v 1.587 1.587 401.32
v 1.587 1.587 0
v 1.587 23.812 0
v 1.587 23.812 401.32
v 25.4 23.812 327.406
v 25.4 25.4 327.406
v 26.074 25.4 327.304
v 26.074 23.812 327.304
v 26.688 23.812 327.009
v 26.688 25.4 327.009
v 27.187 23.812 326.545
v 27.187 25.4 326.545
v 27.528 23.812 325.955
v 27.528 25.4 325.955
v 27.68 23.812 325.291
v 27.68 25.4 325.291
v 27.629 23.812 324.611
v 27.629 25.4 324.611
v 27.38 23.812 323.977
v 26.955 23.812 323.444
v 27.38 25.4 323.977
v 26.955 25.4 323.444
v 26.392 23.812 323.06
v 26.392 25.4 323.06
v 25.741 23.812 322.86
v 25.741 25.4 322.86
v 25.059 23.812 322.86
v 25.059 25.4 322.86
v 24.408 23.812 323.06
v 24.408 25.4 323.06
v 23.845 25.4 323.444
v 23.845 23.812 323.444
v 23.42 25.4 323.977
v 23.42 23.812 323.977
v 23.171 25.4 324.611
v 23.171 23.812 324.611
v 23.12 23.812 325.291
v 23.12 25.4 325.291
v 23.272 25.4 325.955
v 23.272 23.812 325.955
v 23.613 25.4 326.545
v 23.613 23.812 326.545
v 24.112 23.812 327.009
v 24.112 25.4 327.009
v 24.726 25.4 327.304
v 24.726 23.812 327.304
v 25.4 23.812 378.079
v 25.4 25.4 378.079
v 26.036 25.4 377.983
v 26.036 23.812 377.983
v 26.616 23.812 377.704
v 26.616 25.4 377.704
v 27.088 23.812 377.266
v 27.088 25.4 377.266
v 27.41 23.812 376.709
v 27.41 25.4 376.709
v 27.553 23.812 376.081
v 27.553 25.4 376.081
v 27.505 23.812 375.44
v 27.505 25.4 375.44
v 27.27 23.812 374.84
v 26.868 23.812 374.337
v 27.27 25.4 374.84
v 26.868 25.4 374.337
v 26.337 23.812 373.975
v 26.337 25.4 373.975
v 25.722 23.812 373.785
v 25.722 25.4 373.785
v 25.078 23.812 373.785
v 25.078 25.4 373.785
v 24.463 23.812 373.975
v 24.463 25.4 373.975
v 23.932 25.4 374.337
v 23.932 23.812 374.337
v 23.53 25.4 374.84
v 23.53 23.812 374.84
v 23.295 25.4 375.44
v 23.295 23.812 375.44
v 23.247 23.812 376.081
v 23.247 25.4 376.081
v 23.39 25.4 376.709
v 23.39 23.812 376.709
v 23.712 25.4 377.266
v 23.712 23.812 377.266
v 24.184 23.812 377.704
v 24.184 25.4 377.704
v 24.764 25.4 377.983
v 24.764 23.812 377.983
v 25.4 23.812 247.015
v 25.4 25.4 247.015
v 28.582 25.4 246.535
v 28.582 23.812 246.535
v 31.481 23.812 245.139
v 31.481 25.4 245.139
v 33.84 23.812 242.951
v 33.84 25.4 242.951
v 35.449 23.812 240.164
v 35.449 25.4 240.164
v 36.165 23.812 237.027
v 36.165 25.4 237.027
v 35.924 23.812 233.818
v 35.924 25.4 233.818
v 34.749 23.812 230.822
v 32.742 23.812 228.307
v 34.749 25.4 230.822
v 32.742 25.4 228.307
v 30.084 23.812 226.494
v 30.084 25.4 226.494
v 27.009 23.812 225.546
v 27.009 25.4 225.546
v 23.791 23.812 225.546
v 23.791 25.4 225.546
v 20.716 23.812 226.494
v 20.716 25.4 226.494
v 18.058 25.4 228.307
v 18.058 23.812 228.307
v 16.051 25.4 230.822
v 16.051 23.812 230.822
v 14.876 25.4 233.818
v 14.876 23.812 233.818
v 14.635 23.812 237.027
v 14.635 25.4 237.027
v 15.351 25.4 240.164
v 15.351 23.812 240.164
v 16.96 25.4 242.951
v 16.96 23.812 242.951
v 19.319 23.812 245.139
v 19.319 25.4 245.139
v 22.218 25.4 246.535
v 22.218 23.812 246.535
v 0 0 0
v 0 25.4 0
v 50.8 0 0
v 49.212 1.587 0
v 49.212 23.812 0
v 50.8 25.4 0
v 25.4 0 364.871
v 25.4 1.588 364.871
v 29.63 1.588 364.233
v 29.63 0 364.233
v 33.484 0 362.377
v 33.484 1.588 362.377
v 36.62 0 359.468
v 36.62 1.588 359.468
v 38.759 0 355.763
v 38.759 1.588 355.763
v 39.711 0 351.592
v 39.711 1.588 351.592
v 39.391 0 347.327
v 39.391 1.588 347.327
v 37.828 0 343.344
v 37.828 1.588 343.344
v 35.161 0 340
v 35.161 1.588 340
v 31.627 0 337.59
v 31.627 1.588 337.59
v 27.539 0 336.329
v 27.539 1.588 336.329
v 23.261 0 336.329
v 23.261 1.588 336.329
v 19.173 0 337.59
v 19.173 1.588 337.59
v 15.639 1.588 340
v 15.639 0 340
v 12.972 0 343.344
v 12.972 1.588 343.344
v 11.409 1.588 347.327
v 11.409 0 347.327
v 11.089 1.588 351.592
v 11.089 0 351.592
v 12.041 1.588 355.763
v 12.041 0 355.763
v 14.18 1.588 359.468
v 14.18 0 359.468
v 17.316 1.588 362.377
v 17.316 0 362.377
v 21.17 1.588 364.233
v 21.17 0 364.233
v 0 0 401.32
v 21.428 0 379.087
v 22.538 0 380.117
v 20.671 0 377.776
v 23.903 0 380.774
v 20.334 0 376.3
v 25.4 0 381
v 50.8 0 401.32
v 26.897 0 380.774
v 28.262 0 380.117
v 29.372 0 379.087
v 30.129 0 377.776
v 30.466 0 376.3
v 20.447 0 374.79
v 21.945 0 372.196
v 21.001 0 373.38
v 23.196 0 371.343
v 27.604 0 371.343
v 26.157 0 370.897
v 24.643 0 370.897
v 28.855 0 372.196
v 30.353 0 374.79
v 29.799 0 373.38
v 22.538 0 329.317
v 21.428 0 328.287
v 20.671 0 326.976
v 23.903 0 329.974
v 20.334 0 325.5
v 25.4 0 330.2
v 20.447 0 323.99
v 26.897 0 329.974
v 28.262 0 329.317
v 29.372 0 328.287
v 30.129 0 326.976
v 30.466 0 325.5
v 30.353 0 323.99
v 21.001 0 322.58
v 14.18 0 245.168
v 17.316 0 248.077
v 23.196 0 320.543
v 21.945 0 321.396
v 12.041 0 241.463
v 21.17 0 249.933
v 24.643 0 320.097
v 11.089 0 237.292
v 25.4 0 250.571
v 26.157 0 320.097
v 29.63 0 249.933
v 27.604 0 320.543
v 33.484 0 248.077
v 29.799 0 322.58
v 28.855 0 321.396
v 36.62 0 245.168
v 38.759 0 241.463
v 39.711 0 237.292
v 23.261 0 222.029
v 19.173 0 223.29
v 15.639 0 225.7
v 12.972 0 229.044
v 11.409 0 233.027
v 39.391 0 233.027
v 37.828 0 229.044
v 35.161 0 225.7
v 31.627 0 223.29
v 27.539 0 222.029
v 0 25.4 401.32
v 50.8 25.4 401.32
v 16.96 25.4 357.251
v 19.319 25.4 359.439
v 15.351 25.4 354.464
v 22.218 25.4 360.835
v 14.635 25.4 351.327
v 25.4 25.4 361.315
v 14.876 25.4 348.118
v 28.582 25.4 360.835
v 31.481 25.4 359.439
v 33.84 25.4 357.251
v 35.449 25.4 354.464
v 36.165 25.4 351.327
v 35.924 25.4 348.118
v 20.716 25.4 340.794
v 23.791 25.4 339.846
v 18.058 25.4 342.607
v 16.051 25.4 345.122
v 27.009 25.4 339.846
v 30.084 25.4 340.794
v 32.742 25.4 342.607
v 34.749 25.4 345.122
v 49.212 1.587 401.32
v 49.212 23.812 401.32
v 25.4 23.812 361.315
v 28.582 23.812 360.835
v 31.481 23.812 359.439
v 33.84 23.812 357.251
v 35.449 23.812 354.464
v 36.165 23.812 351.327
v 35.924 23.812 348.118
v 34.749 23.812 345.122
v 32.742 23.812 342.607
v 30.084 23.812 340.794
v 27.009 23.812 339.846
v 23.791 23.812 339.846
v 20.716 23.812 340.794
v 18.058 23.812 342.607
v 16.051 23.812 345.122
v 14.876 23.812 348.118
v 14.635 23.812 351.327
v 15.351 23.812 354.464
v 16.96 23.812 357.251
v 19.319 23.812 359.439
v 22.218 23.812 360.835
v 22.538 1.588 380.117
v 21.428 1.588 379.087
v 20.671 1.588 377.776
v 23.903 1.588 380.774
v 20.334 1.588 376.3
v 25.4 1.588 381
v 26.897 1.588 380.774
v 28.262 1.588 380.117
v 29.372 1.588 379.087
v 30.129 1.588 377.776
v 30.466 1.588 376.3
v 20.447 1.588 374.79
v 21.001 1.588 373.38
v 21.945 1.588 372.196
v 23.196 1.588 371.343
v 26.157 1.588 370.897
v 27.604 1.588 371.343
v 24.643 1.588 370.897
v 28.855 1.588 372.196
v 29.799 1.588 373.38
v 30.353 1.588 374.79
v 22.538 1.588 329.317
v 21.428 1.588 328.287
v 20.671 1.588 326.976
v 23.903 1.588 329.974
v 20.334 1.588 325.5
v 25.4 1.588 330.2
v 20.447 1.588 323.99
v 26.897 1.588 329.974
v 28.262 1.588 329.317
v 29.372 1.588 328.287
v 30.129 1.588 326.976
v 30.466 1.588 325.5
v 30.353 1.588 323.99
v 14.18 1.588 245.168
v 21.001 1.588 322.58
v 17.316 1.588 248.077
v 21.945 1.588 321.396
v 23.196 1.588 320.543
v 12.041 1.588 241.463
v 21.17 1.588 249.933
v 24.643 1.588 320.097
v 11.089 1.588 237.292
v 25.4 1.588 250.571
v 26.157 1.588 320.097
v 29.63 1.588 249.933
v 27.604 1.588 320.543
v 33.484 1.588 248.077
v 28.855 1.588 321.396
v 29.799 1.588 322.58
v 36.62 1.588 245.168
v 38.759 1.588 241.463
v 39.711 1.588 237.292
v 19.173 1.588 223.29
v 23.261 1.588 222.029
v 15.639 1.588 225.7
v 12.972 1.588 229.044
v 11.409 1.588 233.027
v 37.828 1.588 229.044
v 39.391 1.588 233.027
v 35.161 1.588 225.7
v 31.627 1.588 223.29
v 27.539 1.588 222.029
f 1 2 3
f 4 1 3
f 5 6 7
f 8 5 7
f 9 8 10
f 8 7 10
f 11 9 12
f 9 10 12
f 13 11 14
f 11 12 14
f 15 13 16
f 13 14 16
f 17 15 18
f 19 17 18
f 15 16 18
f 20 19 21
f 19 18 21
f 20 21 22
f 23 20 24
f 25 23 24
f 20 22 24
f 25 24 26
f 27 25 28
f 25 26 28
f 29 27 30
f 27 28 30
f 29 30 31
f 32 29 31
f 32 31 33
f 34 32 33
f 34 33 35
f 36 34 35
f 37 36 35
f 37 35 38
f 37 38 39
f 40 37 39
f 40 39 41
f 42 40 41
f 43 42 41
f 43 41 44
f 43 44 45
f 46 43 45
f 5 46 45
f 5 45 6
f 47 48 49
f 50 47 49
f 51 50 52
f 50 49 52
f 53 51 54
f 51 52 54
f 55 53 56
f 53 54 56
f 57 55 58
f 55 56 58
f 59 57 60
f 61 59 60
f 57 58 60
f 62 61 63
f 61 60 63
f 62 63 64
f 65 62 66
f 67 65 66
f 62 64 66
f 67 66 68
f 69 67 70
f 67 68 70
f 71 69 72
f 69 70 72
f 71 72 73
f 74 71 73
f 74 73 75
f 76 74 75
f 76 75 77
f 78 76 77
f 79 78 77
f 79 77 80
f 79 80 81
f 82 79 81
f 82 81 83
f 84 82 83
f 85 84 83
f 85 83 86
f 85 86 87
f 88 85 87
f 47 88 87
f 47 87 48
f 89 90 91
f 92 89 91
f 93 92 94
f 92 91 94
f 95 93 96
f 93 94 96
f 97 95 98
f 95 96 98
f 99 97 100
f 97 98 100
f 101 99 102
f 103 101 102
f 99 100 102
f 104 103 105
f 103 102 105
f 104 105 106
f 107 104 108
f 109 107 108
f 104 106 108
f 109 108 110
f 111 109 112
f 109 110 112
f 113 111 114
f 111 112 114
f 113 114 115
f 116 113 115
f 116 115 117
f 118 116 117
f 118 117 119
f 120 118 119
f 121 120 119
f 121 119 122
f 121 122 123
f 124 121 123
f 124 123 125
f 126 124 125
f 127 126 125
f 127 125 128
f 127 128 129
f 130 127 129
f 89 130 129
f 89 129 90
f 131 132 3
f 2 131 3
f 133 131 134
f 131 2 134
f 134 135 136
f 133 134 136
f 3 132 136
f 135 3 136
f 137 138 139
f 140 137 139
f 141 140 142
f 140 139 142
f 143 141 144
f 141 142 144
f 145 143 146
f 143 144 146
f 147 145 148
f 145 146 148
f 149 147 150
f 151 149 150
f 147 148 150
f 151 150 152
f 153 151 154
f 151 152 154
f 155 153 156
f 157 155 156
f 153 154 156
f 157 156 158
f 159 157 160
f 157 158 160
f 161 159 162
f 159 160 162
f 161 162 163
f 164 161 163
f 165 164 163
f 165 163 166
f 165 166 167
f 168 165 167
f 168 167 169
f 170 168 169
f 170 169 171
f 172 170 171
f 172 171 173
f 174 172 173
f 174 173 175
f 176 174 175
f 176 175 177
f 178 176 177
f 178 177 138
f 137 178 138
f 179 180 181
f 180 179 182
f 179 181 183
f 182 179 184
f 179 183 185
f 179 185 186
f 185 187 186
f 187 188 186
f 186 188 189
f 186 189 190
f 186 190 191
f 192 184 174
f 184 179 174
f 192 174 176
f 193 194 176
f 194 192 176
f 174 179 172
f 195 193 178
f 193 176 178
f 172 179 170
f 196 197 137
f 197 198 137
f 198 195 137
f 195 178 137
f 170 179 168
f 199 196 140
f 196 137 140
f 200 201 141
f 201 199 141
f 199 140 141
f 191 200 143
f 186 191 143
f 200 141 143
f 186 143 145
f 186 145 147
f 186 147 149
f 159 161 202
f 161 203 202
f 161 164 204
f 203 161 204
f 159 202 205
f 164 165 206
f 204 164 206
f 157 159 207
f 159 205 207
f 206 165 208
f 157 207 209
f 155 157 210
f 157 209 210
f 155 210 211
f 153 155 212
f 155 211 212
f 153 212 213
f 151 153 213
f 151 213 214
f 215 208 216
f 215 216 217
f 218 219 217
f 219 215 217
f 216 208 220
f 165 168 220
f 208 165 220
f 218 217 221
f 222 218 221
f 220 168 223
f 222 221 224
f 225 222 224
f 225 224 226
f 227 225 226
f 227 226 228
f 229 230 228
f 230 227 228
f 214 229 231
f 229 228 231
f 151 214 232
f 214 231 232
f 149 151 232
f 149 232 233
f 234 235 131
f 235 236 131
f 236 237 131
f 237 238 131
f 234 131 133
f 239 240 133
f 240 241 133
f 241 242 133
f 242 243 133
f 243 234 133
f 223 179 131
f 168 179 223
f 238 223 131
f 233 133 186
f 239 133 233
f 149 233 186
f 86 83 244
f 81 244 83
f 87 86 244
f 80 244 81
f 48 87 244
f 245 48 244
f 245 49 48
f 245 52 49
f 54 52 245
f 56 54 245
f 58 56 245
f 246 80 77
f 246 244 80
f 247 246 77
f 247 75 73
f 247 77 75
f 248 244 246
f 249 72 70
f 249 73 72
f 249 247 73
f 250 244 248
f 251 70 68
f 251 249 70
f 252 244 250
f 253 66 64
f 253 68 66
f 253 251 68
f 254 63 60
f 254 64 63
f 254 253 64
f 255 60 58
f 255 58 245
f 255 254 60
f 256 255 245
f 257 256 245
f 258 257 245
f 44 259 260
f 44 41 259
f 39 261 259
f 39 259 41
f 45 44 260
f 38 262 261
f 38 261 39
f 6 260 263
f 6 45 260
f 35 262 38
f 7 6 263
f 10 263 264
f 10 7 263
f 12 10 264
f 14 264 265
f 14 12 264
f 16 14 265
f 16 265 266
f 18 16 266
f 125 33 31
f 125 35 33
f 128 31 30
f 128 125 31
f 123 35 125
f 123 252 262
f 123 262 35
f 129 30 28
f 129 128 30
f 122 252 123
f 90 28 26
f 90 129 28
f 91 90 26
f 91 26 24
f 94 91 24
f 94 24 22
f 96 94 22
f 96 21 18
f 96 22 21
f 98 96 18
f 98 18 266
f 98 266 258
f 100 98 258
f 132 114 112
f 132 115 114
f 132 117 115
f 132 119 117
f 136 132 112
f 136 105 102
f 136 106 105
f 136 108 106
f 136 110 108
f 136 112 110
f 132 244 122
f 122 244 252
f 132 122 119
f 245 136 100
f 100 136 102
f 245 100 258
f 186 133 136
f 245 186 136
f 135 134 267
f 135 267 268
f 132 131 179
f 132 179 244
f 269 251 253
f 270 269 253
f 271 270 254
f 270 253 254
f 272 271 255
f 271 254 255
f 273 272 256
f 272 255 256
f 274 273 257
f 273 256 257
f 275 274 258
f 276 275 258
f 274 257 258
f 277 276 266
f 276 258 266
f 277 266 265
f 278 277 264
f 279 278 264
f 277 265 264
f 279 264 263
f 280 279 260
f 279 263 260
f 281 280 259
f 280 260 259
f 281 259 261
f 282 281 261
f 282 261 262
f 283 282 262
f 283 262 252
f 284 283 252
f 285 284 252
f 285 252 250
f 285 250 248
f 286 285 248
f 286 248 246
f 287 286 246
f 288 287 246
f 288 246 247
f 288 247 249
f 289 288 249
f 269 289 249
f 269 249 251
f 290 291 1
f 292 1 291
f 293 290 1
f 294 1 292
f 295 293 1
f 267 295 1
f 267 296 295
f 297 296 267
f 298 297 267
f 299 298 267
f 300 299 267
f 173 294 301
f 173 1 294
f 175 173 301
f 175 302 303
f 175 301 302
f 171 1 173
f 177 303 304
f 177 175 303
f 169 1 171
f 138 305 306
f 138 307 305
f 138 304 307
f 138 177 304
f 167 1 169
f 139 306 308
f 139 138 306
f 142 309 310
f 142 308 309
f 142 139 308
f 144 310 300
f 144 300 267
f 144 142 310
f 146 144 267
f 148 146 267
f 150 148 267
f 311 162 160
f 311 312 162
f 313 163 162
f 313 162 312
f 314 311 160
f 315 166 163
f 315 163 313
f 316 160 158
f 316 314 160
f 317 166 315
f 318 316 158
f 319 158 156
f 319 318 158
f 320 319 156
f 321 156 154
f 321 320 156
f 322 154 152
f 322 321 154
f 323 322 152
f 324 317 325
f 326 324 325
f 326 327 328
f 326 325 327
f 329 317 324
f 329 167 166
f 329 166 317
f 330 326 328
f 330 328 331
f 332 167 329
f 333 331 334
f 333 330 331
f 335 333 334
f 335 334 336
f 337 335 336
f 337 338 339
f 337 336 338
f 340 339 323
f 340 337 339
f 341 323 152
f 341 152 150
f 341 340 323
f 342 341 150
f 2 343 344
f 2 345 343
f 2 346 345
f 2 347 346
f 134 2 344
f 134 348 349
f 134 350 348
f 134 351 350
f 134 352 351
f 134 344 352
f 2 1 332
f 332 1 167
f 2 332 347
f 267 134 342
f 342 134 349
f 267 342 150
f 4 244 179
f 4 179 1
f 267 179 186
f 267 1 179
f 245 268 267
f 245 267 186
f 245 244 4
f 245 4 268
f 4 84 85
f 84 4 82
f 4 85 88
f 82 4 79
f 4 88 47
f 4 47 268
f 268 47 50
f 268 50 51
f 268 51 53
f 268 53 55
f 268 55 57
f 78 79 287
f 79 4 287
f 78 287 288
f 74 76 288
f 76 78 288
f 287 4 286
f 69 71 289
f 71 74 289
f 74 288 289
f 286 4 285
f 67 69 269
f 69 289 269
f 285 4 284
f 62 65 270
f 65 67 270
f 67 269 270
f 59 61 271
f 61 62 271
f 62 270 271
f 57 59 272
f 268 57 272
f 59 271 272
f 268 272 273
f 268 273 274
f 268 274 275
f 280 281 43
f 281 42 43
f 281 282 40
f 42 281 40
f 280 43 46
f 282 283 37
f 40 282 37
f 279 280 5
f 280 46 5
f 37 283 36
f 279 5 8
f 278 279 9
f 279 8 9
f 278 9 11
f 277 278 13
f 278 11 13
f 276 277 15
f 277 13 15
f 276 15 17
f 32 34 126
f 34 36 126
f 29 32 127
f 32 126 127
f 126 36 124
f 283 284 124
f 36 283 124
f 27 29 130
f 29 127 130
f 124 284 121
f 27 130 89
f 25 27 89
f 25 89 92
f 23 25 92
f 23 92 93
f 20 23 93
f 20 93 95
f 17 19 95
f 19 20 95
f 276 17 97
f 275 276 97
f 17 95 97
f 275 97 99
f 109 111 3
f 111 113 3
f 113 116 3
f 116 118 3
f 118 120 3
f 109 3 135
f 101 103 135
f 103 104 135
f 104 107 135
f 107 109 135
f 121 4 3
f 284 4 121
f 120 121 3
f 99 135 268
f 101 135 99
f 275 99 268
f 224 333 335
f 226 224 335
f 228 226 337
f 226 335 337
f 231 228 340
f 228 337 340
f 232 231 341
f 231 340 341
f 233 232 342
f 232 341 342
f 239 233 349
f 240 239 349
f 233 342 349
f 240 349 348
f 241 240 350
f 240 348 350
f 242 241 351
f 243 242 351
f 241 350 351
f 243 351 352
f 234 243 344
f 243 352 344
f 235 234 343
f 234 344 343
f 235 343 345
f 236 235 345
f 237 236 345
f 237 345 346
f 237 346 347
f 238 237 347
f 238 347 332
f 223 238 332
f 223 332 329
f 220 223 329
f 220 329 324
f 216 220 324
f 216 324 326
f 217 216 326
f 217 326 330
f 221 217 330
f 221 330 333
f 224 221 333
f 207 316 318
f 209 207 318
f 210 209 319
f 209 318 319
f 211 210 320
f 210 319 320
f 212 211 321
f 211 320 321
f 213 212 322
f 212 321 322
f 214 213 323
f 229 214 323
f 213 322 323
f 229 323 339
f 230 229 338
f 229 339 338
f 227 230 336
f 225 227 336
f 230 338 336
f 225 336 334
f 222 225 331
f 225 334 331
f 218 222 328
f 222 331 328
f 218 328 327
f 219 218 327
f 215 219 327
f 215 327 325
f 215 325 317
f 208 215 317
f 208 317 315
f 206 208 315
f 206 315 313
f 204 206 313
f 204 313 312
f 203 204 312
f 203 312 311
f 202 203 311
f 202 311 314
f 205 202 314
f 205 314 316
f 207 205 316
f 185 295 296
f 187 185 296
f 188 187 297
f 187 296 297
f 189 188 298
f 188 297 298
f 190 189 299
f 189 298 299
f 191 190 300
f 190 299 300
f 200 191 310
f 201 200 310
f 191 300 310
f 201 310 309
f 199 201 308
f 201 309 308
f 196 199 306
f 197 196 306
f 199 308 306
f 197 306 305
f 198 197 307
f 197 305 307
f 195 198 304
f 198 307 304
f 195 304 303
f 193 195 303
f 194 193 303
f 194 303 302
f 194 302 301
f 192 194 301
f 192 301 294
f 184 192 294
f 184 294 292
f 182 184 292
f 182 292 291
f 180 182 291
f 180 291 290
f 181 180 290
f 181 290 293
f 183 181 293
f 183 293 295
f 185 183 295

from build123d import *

# Parameters (mm, degrees)
SKETCH1_W           = 50.8
SKETCH1_H           = 25.4
SKETCH1_W_2         = 47.625
SKETCH1_H_2         = 22.225
BOSS_EXTRUDE1_DEPTH = 401.32
SKETCH2_R           = 10.795
CUT_EXTRUDE1_DEPTH  = 2.54
SKETCH3_R           = 10.795
CUT_EXTRUDE2_DEPTH  = 4.92
SKETCH5_R           = 14.351
CUT_EXTRUDE3_DEPTH  = 12.7
SKETCH6_R           = 14.351
CUT_EXTRUDE4_DEPTH  = 12.7
SKETCH7_R           = 2.159
CUT_EXTRUDE5_DEPTH  = 2.54
SKETCH9_R           = 5.08
CUT_EXTRUDE6_DEPTH  = 2.54
SKETCH10_R          = 2.286
CUT_EXTRUDE7_DEPTH  = 2.54
SKETCH11_R          = 5.08
CUT_EXTRUDE8_DEPTH  = 2.54


with BuildPart() as part:
    # Sketch1 → Boss-Extrude1 (new body)
    with BuildSketch(Plane.XY):
        with Locations((25.4, 12.7)):
            Rectangle(SKETCH1_W, SKETCH1_H)
        with Locations((25.4, 12.7)):
            Rectangle(SKETCH1_W_2, SKETCH1_H_2, mode=Mode.SUBTRACT)
    extrude(amount=BOSS_EXTRUDE1_DEPTH)

    # Sketch2 → Cut-Extrude1 (cut)
    with BuildSketch(Plane(origin=(0, 25.4, 0), x_dir=(1, 0, 0), z_dir=(0, 1, 0))):
        with Locations(Location((25.4, -236.22, 0), (0, 0, 270))):
            Circle(SKETCH2_R)
    extrude(amount=-CUT_EXTRUDE1_DEPTH, mode=Mode.SUBTRACT)

    # Sketch3 → Cut-Extrude2 (cut)
    with BuildSketch(Plane(origin=(0, 25.4, 0), x_dir=(1, 0, 0), z_dir=(0, 1, 0))):
        with Locations(Location((25.4, -350.52, 0), (0, 0, 270))):
            Circle(SKETCH3_R)
    extrude(amount=-CUT_EXTRUDE2_DEPTH, mode=Mode.SUBTRACT)

    # Sketch5 → Cut-Extrude3 (cut)
    with BuildSketch(Plane(origin=(0, 1.5875, 0), x_dir=(1, 0, 0), z_dir=(0, 1, 0))):
        with Locations(Location((25.4, -236.22, 0), (0, 0, 270))):
            Circle(SKETCH5_R)
    extrude(amount=-CUT_EXTRUDE3_DEPTH, mode=Mode.SUBTRACT)

    # Sketch6 → Cut-Extrude4 (cut)
    with BuildSketch(Plane(origin=(0, 1.5875, 0), x_dir=(1, 0, 0), z_dir=(0, 1, 0))):
        with Locations(Location((25.4, -350.52, 0), (0, 0, 270))):
            Circle(SKETCH6_R)
    extrude(amount=-CUT_EXTRUDE4_DEPTH, mode=Mode.SUBTRACT)

    # Sketch7 → Cut-Extrude5 (cut)
    with BuildSketch(Plane(origin=(0, 25.4, 0), x_dir=(1, 0, 0), z_dir=(0, 1, 0))):
        with Locations(Location((25.4, -375.92, 0), (0, 0, 270))):
            Circle(SKETCH7_R)
    extrude(amount=-CUT_EXTRUDE5_DEPTH, mode=Mode.SUBTRACT)

    # Sketch9 → Cut-Extrude6 (cut)
    with BuildSketch(Plane(origin=(0, 1.5875, 0), x_dir=(1, 0, 0), z_dir=(0, 1, 0))):
        with Locations(Location((25.4, -375.92, 0), (0, 0, 270))):
            Circle(SKETCH9_R)
    extrude(amount=-CUT_EXTRUDE6_DEPTH, mode=Mode.SUBTRACT)

    # Sketch10 → Cut-Extrude7 (cut)
    with BuildSketch(Plane(origin=(0, 25.4, 0), x_dir=(1, 0, 0), z_dir=(0, 1, 0))):
        with Locations(Location((25.4, -325.12, 0), (0, 0, 270))):
            Circle(SKETCH10_R)
    extrude(amount=-CUT_EXTRUDE7_DEPTH, mode=Mode.SUBTRACT)

    # Sketch11 → Cut-Extrude8 (cut)
    with BuildSketch(Plane(origin=(0, 1.5875, 0), x_dir=(1, 0, 0), z_dir=(0, 1, 0))):
        with Locations(Location((25.4, -325.12, 0), (0, 0, 270))):
            Circle(SKETCH11_R)
    extrude(amount=-CUT_EXTRUDE8_DEPTH, mode=Mode.SUBTRACT)


solid = part.part
